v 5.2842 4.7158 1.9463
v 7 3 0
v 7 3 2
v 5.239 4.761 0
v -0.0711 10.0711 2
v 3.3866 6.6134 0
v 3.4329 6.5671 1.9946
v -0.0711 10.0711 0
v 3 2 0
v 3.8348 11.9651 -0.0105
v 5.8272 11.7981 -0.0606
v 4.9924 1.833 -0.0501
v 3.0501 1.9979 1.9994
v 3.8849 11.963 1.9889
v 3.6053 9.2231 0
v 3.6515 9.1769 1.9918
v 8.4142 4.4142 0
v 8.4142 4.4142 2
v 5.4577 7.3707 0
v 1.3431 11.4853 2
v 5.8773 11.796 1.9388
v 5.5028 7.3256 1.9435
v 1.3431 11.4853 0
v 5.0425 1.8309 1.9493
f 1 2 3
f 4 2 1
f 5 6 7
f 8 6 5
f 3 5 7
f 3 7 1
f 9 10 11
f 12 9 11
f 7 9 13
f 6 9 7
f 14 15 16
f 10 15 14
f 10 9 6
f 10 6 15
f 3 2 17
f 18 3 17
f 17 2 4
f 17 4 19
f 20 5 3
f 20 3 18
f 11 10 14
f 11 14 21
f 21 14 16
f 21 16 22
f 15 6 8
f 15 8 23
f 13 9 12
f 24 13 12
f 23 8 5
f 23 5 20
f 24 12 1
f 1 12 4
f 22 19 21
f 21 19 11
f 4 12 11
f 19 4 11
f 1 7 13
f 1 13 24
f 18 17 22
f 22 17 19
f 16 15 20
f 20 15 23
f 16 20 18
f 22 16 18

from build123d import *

# Parameters (mm, degrees)
BOX001_W               = 2
BOX001_H               = 10
BOX001_DEPTH           = 2
BOX001_ROLL_ANGLE      = -0.060026
BOX001_PITCH_ANGLE     = 1.435067
BOX001_PLACEMENT_ANGLE = -4.790134
BOX_W                  = 2
BOX_H                  = 10
BOX_DEPTH              = 2
BOX_PLACEMENT_ANGLE    = 45


with BuildPart() as cubo001:
    # Box001 → Box001 (new body)
    with BuildSketch(Plane.XY):
        with Locations((1, 5)):
            Rectangle(BOX001_W, BOX001_H)
    extrude(amount=BOX001_DEPTH)


with BuildPart() as cubo001_1:
    # Box001 roll: moved
    add(cubo001.part.rotate(Axis((0, 0, 0), (1, 0, 0)), BOX001_ROLL_ANGLE))


with BuildPart() as cubo001_2:
    # Box001 pitch: moved
    add(cubo001_1.part.rotate(Axis((0, 0, 0), (0, 1, 0)), BOX001_PITCH_ANGLE))


with BuildPart() as cubo001_3:
    # Box001 placement: moved
    add(cubo001_2.part.moved(Location((3, 2, 0))).rotate(Axis((3, 2, 0), (0, 0, 1)), BOX001_PLACEMENT_ANGLE))


with BuildPart() as fusion:
    # Box → Box (new body)
    with BuildSketch(Plane.XY):
        with Locations((1, 5)):
            Rectangle(BOX_W, BOX_H)
    extrude(amount=BOX_DEPTH)


with BuildPart() as fusion_1:
    # Box placement: moved
    add(fusion.part.moved(Location((7, 3, 0))).rotate(Axis((7, 3, 0), (0, 0, 1)), BOX_PLACEMENT_ANGLE))

    # Fusion: union Cubo001
    add(cubo001_3.part)


solid = fusion_1.part
